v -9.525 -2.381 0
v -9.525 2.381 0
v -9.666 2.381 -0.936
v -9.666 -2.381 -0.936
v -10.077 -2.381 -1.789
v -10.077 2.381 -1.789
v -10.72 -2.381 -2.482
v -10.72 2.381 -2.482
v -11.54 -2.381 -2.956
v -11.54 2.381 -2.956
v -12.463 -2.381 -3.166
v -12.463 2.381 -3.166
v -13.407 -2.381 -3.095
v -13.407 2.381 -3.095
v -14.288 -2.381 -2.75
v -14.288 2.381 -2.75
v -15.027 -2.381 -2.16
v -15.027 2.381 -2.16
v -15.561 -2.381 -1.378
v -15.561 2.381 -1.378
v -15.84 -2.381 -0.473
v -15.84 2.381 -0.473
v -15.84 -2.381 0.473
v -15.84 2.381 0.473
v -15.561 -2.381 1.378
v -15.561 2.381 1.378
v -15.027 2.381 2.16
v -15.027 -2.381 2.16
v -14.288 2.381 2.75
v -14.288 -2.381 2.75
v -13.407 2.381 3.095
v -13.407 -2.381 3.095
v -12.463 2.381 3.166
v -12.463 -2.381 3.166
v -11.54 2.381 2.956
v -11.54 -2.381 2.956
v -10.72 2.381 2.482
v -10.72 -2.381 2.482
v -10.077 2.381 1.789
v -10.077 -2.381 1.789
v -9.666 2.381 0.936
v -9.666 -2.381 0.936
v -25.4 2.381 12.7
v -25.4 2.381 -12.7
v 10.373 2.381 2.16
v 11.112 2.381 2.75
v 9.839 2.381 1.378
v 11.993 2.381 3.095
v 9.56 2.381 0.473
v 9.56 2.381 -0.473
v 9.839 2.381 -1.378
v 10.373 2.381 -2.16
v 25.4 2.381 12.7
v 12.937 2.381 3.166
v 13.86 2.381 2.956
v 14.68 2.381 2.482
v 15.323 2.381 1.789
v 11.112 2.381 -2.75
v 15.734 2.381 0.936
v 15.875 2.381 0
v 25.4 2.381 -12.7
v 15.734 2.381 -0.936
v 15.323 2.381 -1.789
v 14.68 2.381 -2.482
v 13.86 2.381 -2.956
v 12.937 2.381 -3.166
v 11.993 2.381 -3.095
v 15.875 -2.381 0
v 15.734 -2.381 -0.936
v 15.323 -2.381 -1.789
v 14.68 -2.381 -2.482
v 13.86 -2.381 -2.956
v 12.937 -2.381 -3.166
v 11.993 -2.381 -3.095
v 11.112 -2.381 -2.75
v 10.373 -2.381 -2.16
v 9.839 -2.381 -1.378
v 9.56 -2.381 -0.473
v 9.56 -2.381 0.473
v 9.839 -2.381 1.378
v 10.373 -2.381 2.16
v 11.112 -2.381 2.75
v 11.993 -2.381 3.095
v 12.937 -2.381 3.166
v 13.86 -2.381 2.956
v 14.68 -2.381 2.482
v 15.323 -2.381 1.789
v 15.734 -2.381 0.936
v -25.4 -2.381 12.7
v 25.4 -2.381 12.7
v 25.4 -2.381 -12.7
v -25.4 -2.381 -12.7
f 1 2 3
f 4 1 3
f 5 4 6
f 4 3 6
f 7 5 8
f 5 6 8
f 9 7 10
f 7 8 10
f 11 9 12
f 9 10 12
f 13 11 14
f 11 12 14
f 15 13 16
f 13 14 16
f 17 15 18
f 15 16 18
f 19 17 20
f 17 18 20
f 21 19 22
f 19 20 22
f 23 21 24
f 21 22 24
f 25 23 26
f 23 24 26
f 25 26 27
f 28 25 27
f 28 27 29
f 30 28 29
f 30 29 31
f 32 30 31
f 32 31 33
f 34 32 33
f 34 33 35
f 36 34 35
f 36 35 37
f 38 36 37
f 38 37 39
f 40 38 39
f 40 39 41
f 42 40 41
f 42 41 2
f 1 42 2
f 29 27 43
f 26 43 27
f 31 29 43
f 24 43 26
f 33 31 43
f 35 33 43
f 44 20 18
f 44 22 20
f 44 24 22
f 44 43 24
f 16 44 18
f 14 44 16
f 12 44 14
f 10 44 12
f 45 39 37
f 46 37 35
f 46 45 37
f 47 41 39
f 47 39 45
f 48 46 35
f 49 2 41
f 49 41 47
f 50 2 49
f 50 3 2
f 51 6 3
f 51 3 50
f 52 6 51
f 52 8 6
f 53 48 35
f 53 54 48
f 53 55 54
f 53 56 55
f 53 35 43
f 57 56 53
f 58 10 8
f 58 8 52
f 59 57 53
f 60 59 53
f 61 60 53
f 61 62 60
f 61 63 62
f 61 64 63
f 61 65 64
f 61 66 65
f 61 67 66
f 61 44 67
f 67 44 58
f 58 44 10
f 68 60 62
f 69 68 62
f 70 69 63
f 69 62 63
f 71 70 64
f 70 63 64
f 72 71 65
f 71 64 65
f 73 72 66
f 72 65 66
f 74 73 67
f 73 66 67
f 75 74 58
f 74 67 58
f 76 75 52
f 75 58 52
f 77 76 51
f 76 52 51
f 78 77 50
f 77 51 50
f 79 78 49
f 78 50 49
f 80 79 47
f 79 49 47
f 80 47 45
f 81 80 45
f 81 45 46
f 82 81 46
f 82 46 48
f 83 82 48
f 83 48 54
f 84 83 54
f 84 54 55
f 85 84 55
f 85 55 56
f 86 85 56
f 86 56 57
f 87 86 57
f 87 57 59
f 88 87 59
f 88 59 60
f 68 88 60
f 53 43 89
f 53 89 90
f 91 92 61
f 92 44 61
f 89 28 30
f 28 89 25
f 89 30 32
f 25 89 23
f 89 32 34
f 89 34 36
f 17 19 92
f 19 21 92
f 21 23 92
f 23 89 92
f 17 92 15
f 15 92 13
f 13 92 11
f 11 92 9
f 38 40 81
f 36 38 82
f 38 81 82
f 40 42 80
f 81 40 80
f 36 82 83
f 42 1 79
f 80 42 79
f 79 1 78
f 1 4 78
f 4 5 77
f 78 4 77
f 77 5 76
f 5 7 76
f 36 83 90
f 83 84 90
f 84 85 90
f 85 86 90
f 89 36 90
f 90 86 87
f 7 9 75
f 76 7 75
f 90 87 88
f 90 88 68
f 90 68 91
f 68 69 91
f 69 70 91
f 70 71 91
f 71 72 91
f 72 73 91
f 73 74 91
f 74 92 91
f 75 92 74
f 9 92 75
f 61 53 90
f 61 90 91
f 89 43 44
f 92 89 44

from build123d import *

# Parameters (mm, degrees)
SKETCH1_W           = 50.8
SKETCH1_H           = 25.4
BOSS_EXTRUDE1_DEPTH = 2.38125
CUT_EXTRUDE1_REACH  = 6.763
SKETCH2_R           = 3.175


with BuildPart() as part:
    # Sketch1 → Boss-Extrude1 (new body, symmetric)
    with BuildSketch(Plane(origin=(0, 0, 0), x_dir=(1, 0, 0), z_dir=(0, 1, 0))):
        Rectangle(SKETCH1_W, SKETCH1_H)
    extrude(amount=BOSS_EXTRUDE1_DEPTH, both=True)

    # Sketch2 → Cut-Extrude1 (cut, up to next)
    with BuildSketch(Plane(origin=(0, 2.38125, 0), x_dir=(1, 0, 0), z_dir=(0, 1, 0)), mode=Mode.PRIVATE) as cut_extrude1_sk1:
        with Locations((-12.7, 0)):
            Circle(SKETCH2_R)
    cut_extrude1_tool1 = extrude(cut_extrude1_sk1.sketch, amount=-CUT_EXTRUDE1_REACH, mode=Mode.PRIVATE) & part.part
    add(cut_extrude1_tool1.solids().sort_by_distance((-12.7, 2.38125, 0))[0], mode=Mode.SUBTRACT)
    # Sketch2 → Cut-Extrude1 (cut, up to next)
    with BuildSketch(Plane(origin=(0, 2.38125, 0), x_dir=(1, 0, 0), z_dir=(0, 1, 0)), mode=Mode.PRIVATE) as cut_extrude1_sk2:
        with Locations((12.7, 0)):
            Circle(SKETCH2_R)
    cut_extrude1_tool2 = extrude(cut_extrude1_sk2.sketch, amount=-CUT_EXTRUDE1_REACH, mode=Mode.PRIVATE) & part.part
    add(cut_extrude1_tool2.solids().sort_by_distance((12.7, 2.38125, 0))[0], mode=Mode.SUBTRACT)


solid = part.part
